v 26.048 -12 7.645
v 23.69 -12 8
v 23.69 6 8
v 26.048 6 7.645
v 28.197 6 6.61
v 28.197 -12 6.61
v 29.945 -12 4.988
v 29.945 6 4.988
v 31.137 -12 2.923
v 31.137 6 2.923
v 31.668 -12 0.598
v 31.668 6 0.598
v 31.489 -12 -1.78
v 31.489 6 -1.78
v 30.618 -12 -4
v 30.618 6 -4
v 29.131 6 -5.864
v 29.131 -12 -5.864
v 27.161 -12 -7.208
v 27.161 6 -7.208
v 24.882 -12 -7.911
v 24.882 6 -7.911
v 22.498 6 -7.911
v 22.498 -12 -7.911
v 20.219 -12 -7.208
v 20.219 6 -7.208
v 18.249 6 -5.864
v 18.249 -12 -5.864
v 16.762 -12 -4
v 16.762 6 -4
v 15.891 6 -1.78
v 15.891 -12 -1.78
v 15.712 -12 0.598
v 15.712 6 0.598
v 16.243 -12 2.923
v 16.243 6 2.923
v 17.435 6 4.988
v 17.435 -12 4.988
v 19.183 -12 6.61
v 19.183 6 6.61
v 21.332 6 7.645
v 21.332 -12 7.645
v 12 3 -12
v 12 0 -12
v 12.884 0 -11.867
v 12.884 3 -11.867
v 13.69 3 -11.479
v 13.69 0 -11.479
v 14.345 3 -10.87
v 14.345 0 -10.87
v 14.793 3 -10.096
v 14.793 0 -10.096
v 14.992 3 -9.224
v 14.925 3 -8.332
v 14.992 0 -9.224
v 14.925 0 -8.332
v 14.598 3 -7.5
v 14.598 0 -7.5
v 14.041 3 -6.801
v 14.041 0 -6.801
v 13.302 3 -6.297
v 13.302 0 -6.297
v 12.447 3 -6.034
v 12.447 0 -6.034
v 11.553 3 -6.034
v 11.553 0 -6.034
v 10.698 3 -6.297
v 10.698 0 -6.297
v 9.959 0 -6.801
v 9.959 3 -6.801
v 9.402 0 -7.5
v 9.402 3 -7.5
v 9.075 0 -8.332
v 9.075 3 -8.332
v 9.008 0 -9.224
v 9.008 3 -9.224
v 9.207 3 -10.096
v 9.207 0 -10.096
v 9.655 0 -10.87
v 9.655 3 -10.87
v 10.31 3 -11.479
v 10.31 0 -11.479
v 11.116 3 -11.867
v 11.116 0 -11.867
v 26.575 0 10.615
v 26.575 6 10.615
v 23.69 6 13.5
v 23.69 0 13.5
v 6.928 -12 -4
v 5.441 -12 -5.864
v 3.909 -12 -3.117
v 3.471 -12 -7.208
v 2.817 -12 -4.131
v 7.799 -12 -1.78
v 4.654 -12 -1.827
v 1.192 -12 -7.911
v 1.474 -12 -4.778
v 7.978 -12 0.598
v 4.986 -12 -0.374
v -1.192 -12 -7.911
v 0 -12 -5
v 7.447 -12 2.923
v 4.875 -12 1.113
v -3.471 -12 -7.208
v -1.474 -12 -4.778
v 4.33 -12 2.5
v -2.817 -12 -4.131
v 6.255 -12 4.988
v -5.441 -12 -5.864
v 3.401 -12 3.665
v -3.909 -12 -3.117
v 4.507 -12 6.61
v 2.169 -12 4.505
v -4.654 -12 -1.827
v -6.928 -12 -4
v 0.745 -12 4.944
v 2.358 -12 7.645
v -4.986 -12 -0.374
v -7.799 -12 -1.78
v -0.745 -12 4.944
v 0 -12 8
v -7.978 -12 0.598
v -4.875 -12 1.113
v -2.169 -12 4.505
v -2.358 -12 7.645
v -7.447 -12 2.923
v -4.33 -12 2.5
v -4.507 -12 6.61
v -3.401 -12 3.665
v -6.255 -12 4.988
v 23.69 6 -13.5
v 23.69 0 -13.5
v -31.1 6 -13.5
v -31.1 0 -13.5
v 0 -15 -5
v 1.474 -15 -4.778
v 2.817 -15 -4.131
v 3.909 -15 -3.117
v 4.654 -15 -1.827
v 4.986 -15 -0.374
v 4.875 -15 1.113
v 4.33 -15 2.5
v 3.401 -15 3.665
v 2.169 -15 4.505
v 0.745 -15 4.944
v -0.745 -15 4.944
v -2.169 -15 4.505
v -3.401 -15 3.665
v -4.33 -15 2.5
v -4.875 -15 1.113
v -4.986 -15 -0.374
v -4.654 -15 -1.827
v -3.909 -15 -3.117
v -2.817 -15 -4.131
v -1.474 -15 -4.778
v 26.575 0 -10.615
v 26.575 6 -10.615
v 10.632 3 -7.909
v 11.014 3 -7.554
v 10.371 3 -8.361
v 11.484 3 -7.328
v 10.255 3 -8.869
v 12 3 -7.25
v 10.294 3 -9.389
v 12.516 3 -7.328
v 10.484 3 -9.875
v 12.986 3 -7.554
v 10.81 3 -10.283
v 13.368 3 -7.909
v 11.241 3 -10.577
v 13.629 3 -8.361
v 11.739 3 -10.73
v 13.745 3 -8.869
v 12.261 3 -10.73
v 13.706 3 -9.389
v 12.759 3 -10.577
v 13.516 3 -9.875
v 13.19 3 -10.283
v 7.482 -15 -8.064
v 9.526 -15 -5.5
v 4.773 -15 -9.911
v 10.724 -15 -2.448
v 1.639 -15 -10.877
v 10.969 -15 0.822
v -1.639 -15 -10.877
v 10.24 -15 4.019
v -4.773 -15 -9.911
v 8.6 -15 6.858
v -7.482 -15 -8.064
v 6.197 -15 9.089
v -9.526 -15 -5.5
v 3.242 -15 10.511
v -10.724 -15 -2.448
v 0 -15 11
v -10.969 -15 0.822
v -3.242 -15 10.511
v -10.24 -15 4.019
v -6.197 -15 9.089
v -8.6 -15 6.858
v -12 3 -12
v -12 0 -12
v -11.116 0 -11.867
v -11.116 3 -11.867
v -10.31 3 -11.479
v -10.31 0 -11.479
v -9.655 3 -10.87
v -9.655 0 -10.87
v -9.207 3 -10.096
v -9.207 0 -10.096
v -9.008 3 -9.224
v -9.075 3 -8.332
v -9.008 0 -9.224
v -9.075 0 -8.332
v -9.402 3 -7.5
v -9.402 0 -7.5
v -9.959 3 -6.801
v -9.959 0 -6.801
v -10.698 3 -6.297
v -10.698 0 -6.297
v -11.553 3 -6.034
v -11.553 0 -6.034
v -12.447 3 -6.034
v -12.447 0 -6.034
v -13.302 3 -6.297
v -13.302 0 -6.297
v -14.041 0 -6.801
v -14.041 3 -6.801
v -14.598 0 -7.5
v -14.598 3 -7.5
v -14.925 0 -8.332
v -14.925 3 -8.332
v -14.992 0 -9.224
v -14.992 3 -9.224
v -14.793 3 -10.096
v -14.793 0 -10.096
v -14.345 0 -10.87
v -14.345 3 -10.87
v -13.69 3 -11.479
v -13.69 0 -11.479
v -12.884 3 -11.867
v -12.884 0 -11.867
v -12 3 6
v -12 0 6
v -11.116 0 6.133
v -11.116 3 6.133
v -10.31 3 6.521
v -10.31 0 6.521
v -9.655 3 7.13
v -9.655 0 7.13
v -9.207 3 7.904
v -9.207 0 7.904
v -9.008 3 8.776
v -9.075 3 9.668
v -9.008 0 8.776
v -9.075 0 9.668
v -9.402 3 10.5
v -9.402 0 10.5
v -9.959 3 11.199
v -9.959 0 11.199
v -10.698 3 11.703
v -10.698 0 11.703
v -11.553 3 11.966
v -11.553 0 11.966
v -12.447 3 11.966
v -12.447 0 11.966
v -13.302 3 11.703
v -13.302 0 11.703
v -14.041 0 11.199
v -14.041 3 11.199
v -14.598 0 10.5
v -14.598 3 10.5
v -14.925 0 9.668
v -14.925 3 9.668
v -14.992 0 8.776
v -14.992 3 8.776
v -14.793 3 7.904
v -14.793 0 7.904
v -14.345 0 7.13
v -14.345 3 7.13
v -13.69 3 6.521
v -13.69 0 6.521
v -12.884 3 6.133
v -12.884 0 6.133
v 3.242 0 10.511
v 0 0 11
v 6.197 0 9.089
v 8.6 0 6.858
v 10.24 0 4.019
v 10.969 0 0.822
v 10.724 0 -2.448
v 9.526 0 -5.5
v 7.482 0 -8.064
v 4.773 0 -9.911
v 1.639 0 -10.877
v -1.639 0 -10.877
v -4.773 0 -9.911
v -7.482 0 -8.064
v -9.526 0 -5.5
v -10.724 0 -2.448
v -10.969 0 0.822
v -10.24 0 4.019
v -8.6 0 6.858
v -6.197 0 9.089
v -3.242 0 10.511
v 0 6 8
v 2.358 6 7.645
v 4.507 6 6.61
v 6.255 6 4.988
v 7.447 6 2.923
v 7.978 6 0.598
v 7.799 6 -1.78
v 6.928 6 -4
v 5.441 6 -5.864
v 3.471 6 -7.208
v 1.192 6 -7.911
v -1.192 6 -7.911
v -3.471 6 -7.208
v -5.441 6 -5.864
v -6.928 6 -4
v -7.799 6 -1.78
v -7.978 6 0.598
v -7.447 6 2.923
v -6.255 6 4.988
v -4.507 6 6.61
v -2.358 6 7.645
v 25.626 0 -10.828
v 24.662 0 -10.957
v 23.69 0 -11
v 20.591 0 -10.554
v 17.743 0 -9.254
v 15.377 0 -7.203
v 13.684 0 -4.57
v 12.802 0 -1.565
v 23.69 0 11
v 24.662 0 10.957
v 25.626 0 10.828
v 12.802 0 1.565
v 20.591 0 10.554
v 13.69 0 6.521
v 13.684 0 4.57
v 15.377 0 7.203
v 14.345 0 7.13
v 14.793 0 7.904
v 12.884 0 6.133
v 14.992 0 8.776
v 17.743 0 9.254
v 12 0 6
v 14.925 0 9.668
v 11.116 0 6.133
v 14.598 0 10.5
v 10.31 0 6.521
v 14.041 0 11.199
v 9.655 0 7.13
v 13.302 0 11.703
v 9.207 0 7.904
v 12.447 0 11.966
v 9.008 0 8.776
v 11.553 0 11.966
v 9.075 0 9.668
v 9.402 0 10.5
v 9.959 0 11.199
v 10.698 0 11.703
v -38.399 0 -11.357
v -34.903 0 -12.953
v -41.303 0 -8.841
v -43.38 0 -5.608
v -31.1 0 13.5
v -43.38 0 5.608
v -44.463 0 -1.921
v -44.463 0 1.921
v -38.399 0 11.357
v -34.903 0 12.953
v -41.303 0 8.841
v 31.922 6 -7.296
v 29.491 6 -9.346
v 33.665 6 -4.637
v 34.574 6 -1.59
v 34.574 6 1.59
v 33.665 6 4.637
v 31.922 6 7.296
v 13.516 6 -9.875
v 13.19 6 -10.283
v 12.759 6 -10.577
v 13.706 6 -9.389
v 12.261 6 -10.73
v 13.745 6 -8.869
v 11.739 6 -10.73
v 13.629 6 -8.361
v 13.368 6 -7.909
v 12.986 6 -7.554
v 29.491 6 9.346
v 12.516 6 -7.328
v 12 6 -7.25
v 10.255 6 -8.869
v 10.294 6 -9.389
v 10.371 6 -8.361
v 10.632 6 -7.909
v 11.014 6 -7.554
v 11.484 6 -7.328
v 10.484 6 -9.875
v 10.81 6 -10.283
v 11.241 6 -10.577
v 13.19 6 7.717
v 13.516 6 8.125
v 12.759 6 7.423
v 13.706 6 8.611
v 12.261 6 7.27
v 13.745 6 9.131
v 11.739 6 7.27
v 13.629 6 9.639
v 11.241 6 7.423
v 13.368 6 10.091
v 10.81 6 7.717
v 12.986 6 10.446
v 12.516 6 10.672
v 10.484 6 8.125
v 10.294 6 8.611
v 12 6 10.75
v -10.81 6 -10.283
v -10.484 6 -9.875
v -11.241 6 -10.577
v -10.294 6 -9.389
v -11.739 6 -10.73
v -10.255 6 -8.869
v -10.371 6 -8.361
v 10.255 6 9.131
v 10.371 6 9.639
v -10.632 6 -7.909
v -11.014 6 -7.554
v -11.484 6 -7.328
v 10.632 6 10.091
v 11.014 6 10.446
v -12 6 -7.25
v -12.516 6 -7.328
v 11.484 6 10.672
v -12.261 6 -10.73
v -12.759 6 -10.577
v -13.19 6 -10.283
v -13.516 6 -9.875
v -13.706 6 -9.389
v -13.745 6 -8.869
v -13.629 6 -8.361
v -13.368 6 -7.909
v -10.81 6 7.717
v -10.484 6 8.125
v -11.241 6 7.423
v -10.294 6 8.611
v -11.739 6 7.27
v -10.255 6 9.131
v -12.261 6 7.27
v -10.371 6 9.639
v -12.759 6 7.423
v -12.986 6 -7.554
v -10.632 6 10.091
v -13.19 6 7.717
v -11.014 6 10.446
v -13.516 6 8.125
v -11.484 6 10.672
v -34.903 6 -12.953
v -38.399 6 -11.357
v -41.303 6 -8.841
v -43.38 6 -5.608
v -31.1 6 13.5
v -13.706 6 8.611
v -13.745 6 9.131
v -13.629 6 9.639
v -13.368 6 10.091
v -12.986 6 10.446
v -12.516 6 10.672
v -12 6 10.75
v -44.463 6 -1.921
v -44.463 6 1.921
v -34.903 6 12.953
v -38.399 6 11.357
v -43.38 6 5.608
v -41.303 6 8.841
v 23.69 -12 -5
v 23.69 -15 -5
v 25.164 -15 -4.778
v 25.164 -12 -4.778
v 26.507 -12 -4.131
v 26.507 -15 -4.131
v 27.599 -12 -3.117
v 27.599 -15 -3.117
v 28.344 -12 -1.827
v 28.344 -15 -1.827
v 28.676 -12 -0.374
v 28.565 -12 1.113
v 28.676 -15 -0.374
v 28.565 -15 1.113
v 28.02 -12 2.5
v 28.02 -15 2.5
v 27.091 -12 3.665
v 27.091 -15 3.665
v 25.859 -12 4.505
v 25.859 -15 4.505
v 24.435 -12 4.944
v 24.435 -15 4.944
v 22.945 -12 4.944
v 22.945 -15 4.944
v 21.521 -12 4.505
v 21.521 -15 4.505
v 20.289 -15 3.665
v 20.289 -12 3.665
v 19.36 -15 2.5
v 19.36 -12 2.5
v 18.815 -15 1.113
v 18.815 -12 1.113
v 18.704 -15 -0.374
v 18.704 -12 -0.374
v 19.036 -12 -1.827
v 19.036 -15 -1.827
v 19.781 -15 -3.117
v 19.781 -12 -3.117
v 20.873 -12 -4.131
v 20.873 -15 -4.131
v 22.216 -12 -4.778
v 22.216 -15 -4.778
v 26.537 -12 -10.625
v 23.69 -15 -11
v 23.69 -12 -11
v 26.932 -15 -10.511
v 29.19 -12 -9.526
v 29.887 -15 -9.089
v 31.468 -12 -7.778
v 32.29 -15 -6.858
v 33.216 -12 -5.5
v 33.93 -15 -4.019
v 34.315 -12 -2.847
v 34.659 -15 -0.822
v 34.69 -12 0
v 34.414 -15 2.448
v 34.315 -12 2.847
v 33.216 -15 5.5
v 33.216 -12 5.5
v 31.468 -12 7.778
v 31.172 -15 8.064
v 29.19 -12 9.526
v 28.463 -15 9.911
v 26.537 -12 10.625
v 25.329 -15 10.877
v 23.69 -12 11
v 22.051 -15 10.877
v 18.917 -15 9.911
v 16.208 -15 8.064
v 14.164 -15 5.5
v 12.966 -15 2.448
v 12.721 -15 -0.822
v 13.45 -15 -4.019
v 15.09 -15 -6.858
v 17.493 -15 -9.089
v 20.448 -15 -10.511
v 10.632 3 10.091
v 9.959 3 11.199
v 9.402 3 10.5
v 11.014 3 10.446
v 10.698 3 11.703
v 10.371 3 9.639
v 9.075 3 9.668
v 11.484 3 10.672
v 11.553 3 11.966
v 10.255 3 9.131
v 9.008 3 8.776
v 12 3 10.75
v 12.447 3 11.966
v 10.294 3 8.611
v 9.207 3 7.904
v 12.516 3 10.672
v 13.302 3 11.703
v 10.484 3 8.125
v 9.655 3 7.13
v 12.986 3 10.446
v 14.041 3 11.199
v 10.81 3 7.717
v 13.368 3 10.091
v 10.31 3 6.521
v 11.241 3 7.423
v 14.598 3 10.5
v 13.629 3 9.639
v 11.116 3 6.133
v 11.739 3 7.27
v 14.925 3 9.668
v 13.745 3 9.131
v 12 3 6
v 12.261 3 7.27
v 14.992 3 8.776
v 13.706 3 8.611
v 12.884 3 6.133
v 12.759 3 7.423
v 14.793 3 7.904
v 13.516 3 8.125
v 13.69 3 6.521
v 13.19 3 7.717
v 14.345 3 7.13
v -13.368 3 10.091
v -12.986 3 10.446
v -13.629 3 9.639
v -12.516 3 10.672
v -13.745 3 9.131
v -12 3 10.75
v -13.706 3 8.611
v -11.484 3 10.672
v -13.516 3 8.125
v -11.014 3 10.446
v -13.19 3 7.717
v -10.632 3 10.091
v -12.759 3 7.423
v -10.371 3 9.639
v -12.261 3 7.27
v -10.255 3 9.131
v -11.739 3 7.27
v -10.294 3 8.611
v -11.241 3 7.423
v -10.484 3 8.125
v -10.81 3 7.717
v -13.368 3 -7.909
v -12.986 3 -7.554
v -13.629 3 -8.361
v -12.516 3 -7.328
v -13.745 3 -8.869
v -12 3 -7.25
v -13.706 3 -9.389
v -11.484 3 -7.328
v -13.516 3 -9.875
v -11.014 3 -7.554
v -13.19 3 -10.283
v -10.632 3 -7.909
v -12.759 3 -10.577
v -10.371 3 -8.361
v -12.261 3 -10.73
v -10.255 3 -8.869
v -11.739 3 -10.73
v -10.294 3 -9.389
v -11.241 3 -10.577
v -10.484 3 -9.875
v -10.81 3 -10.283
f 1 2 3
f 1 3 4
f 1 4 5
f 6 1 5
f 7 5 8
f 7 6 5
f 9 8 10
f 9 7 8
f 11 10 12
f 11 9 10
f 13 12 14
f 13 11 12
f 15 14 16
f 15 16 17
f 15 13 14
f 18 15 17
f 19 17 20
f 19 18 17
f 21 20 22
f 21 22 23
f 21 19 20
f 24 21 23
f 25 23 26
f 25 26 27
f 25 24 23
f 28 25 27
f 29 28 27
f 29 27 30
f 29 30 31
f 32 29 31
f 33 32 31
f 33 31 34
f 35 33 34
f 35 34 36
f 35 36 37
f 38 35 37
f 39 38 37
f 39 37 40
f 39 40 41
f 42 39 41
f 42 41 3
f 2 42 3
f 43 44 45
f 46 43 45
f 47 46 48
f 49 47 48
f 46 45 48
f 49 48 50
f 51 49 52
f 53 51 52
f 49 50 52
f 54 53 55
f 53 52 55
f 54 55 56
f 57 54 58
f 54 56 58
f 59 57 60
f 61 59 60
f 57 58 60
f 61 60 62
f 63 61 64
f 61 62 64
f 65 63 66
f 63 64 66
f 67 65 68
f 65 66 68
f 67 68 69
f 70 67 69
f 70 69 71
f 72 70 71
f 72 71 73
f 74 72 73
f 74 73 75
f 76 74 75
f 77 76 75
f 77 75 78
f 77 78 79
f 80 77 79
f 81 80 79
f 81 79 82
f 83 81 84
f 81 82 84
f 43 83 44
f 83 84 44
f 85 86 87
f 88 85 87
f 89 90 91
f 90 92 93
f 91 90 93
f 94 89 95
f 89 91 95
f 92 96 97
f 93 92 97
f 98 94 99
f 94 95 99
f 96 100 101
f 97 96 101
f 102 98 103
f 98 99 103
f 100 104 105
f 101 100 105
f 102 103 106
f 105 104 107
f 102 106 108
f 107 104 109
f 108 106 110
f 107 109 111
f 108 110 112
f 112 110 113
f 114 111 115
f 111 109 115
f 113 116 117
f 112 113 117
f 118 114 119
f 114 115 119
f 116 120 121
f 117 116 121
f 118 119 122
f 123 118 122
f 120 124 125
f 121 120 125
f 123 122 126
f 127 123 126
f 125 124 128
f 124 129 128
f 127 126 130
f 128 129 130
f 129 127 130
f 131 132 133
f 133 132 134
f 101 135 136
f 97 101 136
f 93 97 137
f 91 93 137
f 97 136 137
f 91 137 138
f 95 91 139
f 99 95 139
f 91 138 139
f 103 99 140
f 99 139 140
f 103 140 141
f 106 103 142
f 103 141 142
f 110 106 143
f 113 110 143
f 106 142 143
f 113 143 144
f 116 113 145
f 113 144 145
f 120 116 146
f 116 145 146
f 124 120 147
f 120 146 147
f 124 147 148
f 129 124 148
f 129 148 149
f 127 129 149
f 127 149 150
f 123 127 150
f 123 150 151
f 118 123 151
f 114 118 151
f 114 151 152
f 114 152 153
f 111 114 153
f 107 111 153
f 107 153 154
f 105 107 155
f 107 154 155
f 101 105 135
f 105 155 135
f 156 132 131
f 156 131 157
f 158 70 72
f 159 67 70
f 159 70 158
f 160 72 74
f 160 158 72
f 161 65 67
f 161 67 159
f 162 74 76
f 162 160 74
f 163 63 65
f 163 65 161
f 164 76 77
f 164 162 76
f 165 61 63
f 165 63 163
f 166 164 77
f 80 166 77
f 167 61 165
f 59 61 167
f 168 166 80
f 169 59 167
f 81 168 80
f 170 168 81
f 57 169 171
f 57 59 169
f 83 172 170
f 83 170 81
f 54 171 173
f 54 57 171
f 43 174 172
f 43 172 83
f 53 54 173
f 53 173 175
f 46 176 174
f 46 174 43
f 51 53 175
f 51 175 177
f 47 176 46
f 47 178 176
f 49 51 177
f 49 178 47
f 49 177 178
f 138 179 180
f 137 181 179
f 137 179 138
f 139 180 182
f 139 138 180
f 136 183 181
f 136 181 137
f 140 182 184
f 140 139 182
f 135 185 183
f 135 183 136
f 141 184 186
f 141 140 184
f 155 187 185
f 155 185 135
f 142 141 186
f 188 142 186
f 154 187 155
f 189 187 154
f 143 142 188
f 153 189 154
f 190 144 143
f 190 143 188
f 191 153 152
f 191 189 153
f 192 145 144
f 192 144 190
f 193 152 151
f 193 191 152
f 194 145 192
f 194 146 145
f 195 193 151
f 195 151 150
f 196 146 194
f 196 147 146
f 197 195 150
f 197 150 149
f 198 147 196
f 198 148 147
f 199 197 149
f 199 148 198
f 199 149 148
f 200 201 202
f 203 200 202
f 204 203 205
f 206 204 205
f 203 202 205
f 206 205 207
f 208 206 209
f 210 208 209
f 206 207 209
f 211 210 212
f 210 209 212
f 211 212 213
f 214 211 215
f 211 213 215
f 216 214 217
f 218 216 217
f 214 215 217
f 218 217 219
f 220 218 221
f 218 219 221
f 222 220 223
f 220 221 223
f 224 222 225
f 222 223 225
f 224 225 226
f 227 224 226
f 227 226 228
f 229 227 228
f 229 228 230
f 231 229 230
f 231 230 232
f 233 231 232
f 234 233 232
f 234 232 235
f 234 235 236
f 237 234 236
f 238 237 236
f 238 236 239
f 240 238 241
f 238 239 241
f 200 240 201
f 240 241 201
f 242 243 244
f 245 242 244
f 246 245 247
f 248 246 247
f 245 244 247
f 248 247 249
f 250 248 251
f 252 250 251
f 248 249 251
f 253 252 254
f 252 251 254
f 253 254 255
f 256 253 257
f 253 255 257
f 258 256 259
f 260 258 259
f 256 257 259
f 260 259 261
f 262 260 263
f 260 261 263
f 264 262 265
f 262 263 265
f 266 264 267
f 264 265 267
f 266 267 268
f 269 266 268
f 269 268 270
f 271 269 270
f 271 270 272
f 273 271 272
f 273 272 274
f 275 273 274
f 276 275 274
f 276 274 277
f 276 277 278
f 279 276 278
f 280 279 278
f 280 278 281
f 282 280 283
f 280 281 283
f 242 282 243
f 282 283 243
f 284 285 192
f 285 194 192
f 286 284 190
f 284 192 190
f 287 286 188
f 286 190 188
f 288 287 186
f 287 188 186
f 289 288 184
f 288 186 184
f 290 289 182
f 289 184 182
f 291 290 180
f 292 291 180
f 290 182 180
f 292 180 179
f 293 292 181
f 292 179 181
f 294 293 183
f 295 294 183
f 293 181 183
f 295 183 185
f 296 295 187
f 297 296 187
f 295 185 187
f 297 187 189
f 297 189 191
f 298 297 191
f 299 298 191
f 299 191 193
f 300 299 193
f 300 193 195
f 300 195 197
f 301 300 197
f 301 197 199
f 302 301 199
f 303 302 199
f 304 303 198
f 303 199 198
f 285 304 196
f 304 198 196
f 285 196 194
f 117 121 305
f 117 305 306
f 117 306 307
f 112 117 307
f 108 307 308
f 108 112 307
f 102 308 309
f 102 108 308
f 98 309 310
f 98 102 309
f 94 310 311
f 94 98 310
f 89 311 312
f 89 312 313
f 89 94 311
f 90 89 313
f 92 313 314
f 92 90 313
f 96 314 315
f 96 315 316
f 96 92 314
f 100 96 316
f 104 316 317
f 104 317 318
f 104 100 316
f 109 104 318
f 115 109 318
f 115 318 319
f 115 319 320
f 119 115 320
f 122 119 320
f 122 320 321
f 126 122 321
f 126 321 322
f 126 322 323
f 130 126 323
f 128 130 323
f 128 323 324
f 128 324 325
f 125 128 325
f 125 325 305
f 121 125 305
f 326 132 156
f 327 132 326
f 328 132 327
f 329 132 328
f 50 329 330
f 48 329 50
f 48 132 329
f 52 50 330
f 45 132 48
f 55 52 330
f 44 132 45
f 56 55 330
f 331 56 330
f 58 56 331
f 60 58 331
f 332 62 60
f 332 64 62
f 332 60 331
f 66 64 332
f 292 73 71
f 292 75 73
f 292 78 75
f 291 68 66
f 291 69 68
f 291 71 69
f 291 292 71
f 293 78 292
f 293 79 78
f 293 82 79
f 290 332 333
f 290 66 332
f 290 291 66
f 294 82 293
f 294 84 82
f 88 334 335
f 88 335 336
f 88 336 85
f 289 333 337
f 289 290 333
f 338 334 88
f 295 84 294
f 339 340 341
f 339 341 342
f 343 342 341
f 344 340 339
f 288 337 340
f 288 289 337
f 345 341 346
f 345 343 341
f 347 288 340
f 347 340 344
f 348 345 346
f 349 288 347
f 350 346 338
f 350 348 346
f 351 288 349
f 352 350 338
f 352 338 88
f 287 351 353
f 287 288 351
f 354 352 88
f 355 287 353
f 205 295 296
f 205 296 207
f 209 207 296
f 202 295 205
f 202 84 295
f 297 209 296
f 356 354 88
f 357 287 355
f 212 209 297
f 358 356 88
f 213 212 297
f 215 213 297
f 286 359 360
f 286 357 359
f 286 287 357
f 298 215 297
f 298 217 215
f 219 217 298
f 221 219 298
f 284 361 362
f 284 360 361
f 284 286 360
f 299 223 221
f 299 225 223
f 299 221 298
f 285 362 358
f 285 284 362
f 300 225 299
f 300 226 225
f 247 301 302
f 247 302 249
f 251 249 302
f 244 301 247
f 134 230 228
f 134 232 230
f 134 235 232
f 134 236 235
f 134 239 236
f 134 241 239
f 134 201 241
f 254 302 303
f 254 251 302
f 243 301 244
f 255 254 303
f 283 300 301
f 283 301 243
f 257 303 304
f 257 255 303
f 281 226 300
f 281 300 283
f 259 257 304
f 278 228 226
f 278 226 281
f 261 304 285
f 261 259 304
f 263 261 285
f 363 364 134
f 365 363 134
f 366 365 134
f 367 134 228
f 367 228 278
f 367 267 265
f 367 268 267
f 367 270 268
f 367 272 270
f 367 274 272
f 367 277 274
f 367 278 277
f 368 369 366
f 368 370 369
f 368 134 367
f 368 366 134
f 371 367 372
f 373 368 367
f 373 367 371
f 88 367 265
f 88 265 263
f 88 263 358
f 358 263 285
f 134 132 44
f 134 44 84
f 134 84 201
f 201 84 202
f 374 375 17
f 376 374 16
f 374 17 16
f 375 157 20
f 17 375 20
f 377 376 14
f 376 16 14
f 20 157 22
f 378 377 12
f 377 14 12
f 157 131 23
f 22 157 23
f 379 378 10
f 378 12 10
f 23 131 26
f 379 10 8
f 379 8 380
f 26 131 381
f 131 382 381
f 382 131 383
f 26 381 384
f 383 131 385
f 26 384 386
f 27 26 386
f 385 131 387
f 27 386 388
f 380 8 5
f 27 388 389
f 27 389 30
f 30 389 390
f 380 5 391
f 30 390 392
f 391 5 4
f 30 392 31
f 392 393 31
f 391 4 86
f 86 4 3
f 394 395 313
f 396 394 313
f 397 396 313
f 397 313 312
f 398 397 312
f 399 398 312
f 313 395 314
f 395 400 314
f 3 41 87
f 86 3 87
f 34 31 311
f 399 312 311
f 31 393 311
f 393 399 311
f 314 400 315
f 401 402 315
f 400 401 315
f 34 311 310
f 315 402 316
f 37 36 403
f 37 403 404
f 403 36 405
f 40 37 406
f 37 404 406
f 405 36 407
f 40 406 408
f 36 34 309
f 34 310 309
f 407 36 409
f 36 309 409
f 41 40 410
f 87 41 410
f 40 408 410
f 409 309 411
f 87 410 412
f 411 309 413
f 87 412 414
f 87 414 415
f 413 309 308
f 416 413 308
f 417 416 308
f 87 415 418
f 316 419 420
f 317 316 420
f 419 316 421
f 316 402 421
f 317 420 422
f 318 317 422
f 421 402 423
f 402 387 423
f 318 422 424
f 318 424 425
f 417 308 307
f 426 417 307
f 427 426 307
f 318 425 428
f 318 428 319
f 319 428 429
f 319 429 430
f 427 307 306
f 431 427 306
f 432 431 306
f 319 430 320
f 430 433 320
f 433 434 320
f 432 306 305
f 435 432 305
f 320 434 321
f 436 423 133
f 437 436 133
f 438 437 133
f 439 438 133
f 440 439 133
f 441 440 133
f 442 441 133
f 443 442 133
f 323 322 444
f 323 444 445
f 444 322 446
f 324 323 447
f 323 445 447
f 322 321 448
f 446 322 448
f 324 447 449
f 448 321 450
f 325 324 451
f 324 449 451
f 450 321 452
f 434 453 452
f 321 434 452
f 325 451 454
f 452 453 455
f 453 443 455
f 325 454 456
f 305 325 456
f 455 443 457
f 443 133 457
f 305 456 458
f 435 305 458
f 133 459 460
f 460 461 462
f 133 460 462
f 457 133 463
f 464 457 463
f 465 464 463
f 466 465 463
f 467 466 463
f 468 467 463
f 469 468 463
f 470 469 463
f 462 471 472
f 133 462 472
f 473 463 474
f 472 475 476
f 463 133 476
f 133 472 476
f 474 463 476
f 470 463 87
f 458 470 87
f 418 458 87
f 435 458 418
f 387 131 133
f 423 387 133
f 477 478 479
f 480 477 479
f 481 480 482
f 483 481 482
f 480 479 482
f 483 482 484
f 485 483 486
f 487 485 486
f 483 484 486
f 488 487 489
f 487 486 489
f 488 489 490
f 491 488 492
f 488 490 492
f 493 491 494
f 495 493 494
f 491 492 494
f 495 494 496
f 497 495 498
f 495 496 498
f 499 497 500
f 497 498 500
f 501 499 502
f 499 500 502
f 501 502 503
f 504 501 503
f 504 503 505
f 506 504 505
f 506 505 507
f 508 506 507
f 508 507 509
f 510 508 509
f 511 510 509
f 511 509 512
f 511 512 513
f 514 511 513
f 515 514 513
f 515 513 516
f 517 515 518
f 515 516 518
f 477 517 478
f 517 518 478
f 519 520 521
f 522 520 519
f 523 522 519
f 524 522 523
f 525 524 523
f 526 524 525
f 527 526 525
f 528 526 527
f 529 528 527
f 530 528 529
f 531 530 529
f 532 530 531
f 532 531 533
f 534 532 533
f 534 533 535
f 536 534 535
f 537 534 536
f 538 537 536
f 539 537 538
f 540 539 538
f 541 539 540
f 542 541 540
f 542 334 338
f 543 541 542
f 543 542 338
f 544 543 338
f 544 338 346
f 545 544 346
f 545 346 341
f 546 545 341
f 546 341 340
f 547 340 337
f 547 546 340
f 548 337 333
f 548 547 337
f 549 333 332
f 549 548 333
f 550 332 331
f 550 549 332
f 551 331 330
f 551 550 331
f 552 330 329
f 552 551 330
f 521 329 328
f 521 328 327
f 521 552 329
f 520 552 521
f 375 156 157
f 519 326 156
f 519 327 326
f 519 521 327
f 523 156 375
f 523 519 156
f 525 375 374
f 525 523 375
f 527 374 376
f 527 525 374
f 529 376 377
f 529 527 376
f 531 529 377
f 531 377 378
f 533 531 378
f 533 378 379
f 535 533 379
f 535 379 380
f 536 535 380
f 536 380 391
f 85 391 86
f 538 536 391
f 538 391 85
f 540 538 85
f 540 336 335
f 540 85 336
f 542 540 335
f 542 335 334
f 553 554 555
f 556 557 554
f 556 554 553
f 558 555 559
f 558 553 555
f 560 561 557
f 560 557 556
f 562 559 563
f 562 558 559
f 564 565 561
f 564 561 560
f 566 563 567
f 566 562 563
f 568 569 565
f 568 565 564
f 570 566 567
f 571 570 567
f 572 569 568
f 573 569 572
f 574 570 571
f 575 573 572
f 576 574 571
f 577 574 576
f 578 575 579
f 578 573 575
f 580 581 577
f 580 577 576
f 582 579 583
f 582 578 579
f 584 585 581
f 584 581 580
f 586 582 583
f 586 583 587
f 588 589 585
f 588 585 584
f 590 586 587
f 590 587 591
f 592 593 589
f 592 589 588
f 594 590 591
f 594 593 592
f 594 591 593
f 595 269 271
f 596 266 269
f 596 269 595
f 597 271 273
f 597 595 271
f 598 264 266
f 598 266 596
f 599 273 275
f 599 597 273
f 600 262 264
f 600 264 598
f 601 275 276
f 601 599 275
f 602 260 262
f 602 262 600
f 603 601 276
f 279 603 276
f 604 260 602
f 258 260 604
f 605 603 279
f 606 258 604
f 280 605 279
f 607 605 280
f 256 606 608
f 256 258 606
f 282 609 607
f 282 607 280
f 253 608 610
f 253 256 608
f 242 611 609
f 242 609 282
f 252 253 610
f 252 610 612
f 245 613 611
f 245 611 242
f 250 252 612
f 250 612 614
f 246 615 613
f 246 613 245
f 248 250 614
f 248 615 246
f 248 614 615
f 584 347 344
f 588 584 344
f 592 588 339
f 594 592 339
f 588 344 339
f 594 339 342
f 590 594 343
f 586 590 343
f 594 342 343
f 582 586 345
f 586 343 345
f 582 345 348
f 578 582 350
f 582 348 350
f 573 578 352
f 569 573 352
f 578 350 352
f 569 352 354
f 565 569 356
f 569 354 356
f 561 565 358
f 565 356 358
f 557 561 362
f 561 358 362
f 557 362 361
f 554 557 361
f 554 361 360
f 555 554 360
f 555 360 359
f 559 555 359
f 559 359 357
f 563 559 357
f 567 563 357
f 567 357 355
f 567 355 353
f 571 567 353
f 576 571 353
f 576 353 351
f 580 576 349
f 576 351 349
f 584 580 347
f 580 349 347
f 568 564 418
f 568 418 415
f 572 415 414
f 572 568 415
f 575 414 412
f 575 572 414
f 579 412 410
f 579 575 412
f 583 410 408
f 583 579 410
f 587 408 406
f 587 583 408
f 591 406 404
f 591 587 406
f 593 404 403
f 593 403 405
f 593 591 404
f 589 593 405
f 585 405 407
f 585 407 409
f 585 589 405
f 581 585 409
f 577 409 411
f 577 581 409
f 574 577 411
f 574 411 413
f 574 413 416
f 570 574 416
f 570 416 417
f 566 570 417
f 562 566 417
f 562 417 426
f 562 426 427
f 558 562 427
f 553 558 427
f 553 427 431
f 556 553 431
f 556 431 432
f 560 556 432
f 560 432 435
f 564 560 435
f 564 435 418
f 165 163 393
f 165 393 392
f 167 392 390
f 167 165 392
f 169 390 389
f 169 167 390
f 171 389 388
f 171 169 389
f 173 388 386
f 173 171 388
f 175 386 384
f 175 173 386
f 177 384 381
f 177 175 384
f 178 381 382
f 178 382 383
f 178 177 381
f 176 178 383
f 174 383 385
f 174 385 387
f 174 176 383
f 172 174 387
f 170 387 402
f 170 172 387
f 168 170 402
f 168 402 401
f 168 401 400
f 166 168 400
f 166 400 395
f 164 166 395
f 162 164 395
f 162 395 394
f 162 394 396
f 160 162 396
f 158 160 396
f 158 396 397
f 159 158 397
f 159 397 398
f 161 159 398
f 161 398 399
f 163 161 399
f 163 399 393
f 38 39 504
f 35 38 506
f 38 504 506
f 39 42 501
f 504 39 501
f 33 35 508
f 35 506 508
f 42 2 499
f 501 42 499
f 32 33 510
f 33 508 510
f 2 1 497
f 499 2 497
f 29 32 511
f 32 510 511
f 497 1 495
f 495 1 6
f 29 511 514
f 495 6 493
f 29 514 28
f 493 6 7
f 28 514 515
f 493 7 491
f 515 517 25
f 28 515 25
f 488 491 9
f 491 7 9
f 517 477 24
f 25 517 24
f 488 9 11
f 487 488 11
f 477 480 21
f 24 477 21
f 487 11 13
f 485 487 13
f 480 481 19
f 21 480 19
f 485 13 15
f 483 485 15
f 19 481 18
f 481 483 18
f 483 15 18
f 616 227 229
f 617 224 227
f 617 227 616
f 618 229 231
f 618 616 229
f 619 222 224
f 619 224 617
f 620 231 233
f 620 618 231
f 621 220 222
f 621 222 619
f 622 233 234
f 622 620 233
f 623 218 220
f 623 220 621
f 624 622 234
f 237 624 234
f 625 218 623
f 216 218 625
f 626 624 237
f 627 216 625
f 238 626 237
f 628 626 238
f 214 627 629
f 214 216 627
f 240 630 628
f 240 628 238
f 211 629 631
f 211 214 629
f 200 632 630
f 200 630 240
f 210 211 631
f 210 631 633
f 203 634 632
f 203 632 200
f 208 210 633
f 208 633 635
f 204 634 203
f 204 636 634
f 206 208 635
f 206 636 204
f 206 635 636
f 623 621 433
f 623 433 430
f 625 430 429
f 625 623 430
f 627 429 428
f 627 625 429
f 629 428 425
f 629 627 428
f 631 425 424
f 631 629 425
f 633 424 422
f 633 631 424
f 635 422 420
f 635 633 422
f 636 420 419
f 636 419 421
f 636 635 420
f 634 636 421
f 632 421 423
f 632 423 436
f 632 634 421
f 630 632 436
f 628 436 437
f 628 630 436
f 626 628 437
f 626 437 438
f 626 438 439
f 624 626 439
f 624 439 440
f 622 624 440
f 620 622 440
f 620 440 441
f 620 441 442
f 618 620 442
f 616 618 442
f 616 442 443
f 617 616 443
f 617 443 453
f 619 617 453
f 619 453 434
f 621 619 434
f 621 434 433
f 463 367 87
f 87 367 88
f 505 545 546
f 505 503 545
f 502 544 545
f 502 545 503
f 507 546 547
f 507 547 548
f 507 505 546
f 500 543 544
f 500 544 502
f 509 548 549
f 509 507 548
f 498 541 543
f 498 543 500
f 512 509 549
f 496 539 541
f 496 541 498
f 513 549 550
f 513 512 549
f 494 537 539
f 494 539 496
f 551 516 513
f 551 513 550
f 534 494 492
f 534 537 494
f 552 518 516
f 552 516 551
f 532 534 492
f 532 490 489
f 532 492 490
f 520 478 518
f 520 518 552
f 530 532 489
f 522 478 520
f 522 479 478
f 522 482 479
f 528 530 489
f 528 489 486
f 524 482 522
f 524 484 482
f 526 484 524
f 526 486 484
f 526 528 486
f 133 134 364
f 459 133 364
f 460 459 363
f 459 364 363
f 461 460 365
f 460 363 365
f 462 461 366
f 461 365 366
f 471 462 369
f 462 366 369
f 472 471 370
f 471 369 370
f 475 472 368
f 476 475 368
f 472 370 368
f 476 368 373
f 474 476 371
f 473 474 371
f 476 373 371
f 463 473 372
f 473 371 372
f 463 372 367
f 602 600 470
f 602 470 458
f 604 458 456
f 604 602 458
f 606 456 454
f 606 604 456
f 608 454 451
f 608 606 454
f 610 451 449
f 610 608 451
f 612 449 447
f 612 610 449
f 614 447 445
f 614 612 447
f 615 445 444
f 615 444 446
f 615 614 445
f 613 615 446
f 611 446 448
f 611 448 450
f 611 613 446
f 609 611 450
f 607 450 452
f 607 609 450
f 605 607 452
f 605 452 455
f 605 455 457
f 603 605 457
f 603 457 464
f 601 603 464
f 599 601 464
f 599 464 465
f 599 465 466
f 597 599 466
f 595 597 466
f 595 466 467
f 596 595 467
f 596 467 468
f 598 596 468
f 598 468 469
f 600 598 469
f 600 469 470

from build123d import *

# Parameters (mm, degrees)
SKETCH1_R               = 1.75
SKETCH1_R_2             = 5
BOSS_EXTRUDE1_DEPTH     = 6
SKETCH2_R               = 3
SKETCH2_R_2             = 1.75
CUT_EXTRUDE1_DEPTH      = 3
CUT_EXTRUDE2_START      = -3
SKETCH3_R               = 8
SKETCH3_R_2             = 5
CUT_EXTRUDE2_DEPTH      = 3
SKETCH5_R               = 13.5
BOSS_EXTRUDE2_DEPTH     = 6
CUT_EXTRUDE3_DEPTH      = 47.983082062
CUT_EXTRUDE3_DEPTH_BACK = 47.983082062
SKETCH6_R               = 8
BOSS_EXTRUDE6_START     = -12
SKETCH9_R               = 11
SKETCH9_R_2             = 8
BOSS_EXTRUDE6_DEPTH     = 12
BOSS_EXTRUDE7_START     = 3
SKETCH10_R              = 11
SKETCH10_R_2            = 5
BOSS_EXTRUDE7_DEPTH     = 3
CHAMFER3_SIZE           = 2.5


with BuildPart() as part:
    # Sketch1 → Boss-Extrude1 (new body)
    with BuildSketch(Plane(origin=(0, 0, 0), x_dir=(1, 0, 0), z_dir=(0, 1, 0))):
        with BuildLine():
            Line((23.69, 13.5), (-31.1, 13.5))
            Line((-31.1, 13.5), (-31.1, 10.5))
            ThreePointArc((-31.1, 10.5), (-20.6, 0), (-31.1, -10.5))
            Line((-31.1, -10.5), (-31.1, -13.5))
            Line((-31.1, -13.5), (23.69, -13.5))
            Line((23.69, -13.5), (23.69, -11))
            ThreePointArc((23.69, -11), (34.69, 0), (23.69, 11))
            Line((23.69, 11), (23.69, 13.5))
        make_face()
        with Locations(Location((-12, -9, 0), (0, 0, 270))):
            Circle(SKETCH1_R, mode=Mode.SUBTRACT)
        with Locations(Location((12, -9, 0), (0, 0, 270))):
            Circle(SKETCH1_R, mode=Mode.SUBTRACT)
        with Locations(Location((-12, 9, 0), (0, 0, 270))):
            Circle(SKETCH1_R, mode=Mode.SUBTRACT)
        with Locations(Location((0, 0, 0), (0, 0, 270))):
            Circle(SKETCH1_R_2, mode=Mode.SUBTRACT)
        with Locations(Location((12, 9, 0), (0, 0, 270))):
            Circle(SKETCH1_R, mode=Mode.SUBTRACT)
        with Locations(Location((23.69, 0, 0), (0, 0, 270))):
            Circle(SKETCH1_R_2, mode=Mode.SUBTRACT)
    extrude(amount=BOSS_EXTRUDE1_DEPTH)

    # Sketch2 → Cut-Extrude1 (cut)
    # profile 1 of 4: a face of its own
    with BuildSketch(Plane.XZ):
        with Locations(Location((-12, -9, 0), (0, 0, 270))):
            Circle(SKETCH2_R)
        with Locations(Location((-12, -9, 0), (0, 0, 270))):
            Circle(SKETCH2_R_2, mode=Mode.SUBTRACT)
    # profile 2 of 4: a face of its own
    with BuildSketch(Plane.XZ):
        with Locations(Location((-12, 9, 0), (0, 0, 270))):
            Circle(SKETCH2_R)
        with Locations(Location((-12, 9, 0), (0, 0, 270))):
            Circle(SKETCH2_R_2, mode=Mode.SUBTRACT)
    # profile 3 of 4: a face of its own
    with BuildSketch(Plane.XZ):
        with Locations(Location((12, 9, 0), (0, 0, 270))):
            Circle(SKETCH2_R)
        with Locations(Location((12, 9, 0), (0, 0, 270))):
            Circle(SKETCH2_R_2, mode=Mode.SUBTRACT)
    # profile 4 of 4: a face of its own
    with BuildSketch(Plane.XZ):
        with Locations(Location((12, -9, 0), (0, 0, 270))):
            Circle(SKETCH2_R)
        with Locations(Location((12, -9, 0), (0, 0, 270))):
            Circle(SKETCH2_R_2, mode=Mode.SUBTRACT)
    extrude(amount=-CUT_EXTRUDE1_DEPTH, mode=Mode.SUBTRACT)

    # Sketch3 → Cut-Extrude2 (cut)
    # profile 1 of 2: a face of its own
    with BuildSketch(Plane(origin=(0, 6, 0), x_dir=(1, 0, 0), z_dir=(0, 1, 0)).offset(CUT_EXTRUDE2_START)):
        with Locations(Location((0, 0, 0), (0, 0, 270))):
            Circle(SKETCH3_R)
        with Locations(Location((0, 0, 0), (0, 0, 270))):
            Circle(SKETCH3_R_2, mode=Mode.SUBTRACT)
    # profile 2 of 2: a face of its own
    with BuildSketch(Plane(origin=(0, 6, 0), x_dir=(1, 0, 0), z_dir=(0, 1, 0)).offset(CUT_EXTRUDE2_START)):
        with Locations(Location((23.69, 0, 0), (0, 0, 270))):
            Circle(SKETCH3_R)
        with Locations(Location((23.69, 0, 0), (0, 0, 270))):
            Circle(SKETCH3_R_2, mode=Mode.SUBTRACT)
    extrude(amount=CUT_EXTRUDE2_DEPTH, mode=Mode.SUBTRACT)

    # Sketch5 → Boss-Extrude2 (add)
    with BuildSketch(Plane(origin=(0, 0, 0), x_dir=(1, 0, 0), z_dir=(0, 1, 0))):
        with Locations((-31.1, 0)):
            Circle(SKETCH5_R)
    extrude(amount=BOSS_EXTRUDE2_DEPTH)

    # Sketch6 → Cut-Extrude3 (cut, two sides: drawn at the far end of the back side and taken through both)
    with BuildSketch(Plane(origin=(0, 6, 0), x_dir=(1, 0, 0), z_dir=(0, 1, 0)).offset(-CUT_EXTRUDE3_DEPTH_BACK)):
        with Locations(Location((0, 0, 0), (0, 0, 270))):
            Circle(SKETCH6_R)
        with Locations(Location((23.69, 0, 0), (0, 0, 270))):
            Circle(SKETCH6_R)
    extrude(amount=CUT_EXTRUDE3_DEPTH + CUT_EXTRUDE3_DEPTH_BACK, mode=Mode.SUBTRACT)

    # Sketch9 → Boss-Extrude6 (add)
    # profile 1 of 2: a face of its own
    with BuildSketch(Plane(origin=(0, 0, 0), x_dir=(1, 0, 0), z_dir=(0, 1, 0)).offset(BOSS_EXTRUDE6_START)):
        with Locations(Location((0, 0, 0), (0, 0, 270))):
            Circle(SKETCH9_R)
        with Locations(Location((0, 0, 0), (0, 0, 270))):
            Circle(SKETCH9_R_2, mode=Mode.SUBTRACT)
    # profile 2 of 2: a face of its own
    with BuildSketch(Plane(origin=(0, 0, 0), x_dir=(1, 0, 0), z_dir=(0, 1, 0)).offset(BOSS_EXTRUDE6_START)):
        with BuildLine():
            ThreePointArc((23.69, 11), (12.69, 0), (23.69, -11))
            ThreePointArc((23.69, -11), (31.468174593, -7.778174593), (34.69, 0))
            ThreePointArc((34.69, 0), (31.468174593, 7.778174593), (23.69, 11))
        make_face()
        with Locations(Location((23.69, 0, 0), (0, 0, 270))):
            Circle(SKETCH9_R_2, mode=Mode.SUBTRACT)
    extrude(amount=BOSS_EXTRUDE6_DEPTH)

    # Sketch10 → Boss-Extrude7 (add)
    # profile 1 of 2: a face of its own
    with BuildSketch(Plane.XZ.offset(12).offset(BOSS_EXTRUDE7_START)):
        with Locations(Location((23.69, 0, 0), (0, 0, 270))):
            Circle(SKETCH10_R)
        with Locations(Location((23.69, 0, 0), (0, 0, 270))):
            Circle(SKETCH10_R_2, mode=Mode.SUBTRACT)
    # profile 2 of 2: a face of its own
    with BuildSketch(Plane.XZ.offset(12).offset(BOSS_EXTRUDE7_START)):
        with Locations(Location((0, 0, 0), (0, 0, 90))):
            Circle(SKETCH10_R)
        with Locations(Location((0, 0, 0), (0, 0, 270))):
            Circle(SKETCH10_R_2, mode=Mode.SUBTRACT)
    extrude(amount=-BOSS_EXTRUDE7_DEPTH)

    # Chamfer3
    # the kernel refuses this chamfer: 2.5 mm, written as the material it adds along each edge
    with BuildSketch(Plane(origin=(23.69, 0, 11), x_dir=(0.9912092295509808, 0, -0.13230367815352337), z_dir=(0, 1, 0))) as chamfer3_piece_1_section:
        with BuildLine():
            Line((2.910680919, 0), (-CHAMFER3_SIZE * 0.132303678154, -CHAMFER3_SIZE * 0.991209229551))
            Line((-CHAMFER3_SIZE * 0.132303678154, -CHAMFER3_SIZE * 0.991209229551), (0, 0))
            ThreePointArc((0, 0), (1.49552658, -0.096625069), (2.910680919, 0))
        make_face()
    chamfer3_piece_1 = extrude(amount=6, mode=Mode.PRIVATE)
    chamfer3_piece_1 = split(chamfer3_piece_1, bisect_by=Plane(origin=(23.69, 0, 13.5), z_dir=(0, 0, -1)), keep=Keep.TOP, mode=Mode.PRIVATE)
    add(chamfer3_piece_1)
    with BuildSketch(Plane(origin=(23.69, 0, -11), x_dir=(0, 0, -1), z_dir=(0, 1, 0))) as chamfer3_piece_2_section:
        with BuildLine():
            Line((CHAMFER3_SIZE, 0), (-0.385093792, -2.885093792))
            ThreePointArc((-0.385093792, -2.885093792), (-0.102088007, -1.495163601), (0, 0))
            Line((0, 0), (CHAMFER3_SIZE, 0))
        make_face()
    chamfer3_piece_2 = extrude(amount=6, mode=Mode.PRIVATE)
    chamfer3_piece_2 = split(chamfer3_piece_2, bisect_by=Plane(origin=(23.69, 0, -13.5), z_dir=(0, 0, 1)), keep=Keep.TOP, mode=Mode.PRIVATE)
    add(chamfer3_piece_2)


solid = part.part
